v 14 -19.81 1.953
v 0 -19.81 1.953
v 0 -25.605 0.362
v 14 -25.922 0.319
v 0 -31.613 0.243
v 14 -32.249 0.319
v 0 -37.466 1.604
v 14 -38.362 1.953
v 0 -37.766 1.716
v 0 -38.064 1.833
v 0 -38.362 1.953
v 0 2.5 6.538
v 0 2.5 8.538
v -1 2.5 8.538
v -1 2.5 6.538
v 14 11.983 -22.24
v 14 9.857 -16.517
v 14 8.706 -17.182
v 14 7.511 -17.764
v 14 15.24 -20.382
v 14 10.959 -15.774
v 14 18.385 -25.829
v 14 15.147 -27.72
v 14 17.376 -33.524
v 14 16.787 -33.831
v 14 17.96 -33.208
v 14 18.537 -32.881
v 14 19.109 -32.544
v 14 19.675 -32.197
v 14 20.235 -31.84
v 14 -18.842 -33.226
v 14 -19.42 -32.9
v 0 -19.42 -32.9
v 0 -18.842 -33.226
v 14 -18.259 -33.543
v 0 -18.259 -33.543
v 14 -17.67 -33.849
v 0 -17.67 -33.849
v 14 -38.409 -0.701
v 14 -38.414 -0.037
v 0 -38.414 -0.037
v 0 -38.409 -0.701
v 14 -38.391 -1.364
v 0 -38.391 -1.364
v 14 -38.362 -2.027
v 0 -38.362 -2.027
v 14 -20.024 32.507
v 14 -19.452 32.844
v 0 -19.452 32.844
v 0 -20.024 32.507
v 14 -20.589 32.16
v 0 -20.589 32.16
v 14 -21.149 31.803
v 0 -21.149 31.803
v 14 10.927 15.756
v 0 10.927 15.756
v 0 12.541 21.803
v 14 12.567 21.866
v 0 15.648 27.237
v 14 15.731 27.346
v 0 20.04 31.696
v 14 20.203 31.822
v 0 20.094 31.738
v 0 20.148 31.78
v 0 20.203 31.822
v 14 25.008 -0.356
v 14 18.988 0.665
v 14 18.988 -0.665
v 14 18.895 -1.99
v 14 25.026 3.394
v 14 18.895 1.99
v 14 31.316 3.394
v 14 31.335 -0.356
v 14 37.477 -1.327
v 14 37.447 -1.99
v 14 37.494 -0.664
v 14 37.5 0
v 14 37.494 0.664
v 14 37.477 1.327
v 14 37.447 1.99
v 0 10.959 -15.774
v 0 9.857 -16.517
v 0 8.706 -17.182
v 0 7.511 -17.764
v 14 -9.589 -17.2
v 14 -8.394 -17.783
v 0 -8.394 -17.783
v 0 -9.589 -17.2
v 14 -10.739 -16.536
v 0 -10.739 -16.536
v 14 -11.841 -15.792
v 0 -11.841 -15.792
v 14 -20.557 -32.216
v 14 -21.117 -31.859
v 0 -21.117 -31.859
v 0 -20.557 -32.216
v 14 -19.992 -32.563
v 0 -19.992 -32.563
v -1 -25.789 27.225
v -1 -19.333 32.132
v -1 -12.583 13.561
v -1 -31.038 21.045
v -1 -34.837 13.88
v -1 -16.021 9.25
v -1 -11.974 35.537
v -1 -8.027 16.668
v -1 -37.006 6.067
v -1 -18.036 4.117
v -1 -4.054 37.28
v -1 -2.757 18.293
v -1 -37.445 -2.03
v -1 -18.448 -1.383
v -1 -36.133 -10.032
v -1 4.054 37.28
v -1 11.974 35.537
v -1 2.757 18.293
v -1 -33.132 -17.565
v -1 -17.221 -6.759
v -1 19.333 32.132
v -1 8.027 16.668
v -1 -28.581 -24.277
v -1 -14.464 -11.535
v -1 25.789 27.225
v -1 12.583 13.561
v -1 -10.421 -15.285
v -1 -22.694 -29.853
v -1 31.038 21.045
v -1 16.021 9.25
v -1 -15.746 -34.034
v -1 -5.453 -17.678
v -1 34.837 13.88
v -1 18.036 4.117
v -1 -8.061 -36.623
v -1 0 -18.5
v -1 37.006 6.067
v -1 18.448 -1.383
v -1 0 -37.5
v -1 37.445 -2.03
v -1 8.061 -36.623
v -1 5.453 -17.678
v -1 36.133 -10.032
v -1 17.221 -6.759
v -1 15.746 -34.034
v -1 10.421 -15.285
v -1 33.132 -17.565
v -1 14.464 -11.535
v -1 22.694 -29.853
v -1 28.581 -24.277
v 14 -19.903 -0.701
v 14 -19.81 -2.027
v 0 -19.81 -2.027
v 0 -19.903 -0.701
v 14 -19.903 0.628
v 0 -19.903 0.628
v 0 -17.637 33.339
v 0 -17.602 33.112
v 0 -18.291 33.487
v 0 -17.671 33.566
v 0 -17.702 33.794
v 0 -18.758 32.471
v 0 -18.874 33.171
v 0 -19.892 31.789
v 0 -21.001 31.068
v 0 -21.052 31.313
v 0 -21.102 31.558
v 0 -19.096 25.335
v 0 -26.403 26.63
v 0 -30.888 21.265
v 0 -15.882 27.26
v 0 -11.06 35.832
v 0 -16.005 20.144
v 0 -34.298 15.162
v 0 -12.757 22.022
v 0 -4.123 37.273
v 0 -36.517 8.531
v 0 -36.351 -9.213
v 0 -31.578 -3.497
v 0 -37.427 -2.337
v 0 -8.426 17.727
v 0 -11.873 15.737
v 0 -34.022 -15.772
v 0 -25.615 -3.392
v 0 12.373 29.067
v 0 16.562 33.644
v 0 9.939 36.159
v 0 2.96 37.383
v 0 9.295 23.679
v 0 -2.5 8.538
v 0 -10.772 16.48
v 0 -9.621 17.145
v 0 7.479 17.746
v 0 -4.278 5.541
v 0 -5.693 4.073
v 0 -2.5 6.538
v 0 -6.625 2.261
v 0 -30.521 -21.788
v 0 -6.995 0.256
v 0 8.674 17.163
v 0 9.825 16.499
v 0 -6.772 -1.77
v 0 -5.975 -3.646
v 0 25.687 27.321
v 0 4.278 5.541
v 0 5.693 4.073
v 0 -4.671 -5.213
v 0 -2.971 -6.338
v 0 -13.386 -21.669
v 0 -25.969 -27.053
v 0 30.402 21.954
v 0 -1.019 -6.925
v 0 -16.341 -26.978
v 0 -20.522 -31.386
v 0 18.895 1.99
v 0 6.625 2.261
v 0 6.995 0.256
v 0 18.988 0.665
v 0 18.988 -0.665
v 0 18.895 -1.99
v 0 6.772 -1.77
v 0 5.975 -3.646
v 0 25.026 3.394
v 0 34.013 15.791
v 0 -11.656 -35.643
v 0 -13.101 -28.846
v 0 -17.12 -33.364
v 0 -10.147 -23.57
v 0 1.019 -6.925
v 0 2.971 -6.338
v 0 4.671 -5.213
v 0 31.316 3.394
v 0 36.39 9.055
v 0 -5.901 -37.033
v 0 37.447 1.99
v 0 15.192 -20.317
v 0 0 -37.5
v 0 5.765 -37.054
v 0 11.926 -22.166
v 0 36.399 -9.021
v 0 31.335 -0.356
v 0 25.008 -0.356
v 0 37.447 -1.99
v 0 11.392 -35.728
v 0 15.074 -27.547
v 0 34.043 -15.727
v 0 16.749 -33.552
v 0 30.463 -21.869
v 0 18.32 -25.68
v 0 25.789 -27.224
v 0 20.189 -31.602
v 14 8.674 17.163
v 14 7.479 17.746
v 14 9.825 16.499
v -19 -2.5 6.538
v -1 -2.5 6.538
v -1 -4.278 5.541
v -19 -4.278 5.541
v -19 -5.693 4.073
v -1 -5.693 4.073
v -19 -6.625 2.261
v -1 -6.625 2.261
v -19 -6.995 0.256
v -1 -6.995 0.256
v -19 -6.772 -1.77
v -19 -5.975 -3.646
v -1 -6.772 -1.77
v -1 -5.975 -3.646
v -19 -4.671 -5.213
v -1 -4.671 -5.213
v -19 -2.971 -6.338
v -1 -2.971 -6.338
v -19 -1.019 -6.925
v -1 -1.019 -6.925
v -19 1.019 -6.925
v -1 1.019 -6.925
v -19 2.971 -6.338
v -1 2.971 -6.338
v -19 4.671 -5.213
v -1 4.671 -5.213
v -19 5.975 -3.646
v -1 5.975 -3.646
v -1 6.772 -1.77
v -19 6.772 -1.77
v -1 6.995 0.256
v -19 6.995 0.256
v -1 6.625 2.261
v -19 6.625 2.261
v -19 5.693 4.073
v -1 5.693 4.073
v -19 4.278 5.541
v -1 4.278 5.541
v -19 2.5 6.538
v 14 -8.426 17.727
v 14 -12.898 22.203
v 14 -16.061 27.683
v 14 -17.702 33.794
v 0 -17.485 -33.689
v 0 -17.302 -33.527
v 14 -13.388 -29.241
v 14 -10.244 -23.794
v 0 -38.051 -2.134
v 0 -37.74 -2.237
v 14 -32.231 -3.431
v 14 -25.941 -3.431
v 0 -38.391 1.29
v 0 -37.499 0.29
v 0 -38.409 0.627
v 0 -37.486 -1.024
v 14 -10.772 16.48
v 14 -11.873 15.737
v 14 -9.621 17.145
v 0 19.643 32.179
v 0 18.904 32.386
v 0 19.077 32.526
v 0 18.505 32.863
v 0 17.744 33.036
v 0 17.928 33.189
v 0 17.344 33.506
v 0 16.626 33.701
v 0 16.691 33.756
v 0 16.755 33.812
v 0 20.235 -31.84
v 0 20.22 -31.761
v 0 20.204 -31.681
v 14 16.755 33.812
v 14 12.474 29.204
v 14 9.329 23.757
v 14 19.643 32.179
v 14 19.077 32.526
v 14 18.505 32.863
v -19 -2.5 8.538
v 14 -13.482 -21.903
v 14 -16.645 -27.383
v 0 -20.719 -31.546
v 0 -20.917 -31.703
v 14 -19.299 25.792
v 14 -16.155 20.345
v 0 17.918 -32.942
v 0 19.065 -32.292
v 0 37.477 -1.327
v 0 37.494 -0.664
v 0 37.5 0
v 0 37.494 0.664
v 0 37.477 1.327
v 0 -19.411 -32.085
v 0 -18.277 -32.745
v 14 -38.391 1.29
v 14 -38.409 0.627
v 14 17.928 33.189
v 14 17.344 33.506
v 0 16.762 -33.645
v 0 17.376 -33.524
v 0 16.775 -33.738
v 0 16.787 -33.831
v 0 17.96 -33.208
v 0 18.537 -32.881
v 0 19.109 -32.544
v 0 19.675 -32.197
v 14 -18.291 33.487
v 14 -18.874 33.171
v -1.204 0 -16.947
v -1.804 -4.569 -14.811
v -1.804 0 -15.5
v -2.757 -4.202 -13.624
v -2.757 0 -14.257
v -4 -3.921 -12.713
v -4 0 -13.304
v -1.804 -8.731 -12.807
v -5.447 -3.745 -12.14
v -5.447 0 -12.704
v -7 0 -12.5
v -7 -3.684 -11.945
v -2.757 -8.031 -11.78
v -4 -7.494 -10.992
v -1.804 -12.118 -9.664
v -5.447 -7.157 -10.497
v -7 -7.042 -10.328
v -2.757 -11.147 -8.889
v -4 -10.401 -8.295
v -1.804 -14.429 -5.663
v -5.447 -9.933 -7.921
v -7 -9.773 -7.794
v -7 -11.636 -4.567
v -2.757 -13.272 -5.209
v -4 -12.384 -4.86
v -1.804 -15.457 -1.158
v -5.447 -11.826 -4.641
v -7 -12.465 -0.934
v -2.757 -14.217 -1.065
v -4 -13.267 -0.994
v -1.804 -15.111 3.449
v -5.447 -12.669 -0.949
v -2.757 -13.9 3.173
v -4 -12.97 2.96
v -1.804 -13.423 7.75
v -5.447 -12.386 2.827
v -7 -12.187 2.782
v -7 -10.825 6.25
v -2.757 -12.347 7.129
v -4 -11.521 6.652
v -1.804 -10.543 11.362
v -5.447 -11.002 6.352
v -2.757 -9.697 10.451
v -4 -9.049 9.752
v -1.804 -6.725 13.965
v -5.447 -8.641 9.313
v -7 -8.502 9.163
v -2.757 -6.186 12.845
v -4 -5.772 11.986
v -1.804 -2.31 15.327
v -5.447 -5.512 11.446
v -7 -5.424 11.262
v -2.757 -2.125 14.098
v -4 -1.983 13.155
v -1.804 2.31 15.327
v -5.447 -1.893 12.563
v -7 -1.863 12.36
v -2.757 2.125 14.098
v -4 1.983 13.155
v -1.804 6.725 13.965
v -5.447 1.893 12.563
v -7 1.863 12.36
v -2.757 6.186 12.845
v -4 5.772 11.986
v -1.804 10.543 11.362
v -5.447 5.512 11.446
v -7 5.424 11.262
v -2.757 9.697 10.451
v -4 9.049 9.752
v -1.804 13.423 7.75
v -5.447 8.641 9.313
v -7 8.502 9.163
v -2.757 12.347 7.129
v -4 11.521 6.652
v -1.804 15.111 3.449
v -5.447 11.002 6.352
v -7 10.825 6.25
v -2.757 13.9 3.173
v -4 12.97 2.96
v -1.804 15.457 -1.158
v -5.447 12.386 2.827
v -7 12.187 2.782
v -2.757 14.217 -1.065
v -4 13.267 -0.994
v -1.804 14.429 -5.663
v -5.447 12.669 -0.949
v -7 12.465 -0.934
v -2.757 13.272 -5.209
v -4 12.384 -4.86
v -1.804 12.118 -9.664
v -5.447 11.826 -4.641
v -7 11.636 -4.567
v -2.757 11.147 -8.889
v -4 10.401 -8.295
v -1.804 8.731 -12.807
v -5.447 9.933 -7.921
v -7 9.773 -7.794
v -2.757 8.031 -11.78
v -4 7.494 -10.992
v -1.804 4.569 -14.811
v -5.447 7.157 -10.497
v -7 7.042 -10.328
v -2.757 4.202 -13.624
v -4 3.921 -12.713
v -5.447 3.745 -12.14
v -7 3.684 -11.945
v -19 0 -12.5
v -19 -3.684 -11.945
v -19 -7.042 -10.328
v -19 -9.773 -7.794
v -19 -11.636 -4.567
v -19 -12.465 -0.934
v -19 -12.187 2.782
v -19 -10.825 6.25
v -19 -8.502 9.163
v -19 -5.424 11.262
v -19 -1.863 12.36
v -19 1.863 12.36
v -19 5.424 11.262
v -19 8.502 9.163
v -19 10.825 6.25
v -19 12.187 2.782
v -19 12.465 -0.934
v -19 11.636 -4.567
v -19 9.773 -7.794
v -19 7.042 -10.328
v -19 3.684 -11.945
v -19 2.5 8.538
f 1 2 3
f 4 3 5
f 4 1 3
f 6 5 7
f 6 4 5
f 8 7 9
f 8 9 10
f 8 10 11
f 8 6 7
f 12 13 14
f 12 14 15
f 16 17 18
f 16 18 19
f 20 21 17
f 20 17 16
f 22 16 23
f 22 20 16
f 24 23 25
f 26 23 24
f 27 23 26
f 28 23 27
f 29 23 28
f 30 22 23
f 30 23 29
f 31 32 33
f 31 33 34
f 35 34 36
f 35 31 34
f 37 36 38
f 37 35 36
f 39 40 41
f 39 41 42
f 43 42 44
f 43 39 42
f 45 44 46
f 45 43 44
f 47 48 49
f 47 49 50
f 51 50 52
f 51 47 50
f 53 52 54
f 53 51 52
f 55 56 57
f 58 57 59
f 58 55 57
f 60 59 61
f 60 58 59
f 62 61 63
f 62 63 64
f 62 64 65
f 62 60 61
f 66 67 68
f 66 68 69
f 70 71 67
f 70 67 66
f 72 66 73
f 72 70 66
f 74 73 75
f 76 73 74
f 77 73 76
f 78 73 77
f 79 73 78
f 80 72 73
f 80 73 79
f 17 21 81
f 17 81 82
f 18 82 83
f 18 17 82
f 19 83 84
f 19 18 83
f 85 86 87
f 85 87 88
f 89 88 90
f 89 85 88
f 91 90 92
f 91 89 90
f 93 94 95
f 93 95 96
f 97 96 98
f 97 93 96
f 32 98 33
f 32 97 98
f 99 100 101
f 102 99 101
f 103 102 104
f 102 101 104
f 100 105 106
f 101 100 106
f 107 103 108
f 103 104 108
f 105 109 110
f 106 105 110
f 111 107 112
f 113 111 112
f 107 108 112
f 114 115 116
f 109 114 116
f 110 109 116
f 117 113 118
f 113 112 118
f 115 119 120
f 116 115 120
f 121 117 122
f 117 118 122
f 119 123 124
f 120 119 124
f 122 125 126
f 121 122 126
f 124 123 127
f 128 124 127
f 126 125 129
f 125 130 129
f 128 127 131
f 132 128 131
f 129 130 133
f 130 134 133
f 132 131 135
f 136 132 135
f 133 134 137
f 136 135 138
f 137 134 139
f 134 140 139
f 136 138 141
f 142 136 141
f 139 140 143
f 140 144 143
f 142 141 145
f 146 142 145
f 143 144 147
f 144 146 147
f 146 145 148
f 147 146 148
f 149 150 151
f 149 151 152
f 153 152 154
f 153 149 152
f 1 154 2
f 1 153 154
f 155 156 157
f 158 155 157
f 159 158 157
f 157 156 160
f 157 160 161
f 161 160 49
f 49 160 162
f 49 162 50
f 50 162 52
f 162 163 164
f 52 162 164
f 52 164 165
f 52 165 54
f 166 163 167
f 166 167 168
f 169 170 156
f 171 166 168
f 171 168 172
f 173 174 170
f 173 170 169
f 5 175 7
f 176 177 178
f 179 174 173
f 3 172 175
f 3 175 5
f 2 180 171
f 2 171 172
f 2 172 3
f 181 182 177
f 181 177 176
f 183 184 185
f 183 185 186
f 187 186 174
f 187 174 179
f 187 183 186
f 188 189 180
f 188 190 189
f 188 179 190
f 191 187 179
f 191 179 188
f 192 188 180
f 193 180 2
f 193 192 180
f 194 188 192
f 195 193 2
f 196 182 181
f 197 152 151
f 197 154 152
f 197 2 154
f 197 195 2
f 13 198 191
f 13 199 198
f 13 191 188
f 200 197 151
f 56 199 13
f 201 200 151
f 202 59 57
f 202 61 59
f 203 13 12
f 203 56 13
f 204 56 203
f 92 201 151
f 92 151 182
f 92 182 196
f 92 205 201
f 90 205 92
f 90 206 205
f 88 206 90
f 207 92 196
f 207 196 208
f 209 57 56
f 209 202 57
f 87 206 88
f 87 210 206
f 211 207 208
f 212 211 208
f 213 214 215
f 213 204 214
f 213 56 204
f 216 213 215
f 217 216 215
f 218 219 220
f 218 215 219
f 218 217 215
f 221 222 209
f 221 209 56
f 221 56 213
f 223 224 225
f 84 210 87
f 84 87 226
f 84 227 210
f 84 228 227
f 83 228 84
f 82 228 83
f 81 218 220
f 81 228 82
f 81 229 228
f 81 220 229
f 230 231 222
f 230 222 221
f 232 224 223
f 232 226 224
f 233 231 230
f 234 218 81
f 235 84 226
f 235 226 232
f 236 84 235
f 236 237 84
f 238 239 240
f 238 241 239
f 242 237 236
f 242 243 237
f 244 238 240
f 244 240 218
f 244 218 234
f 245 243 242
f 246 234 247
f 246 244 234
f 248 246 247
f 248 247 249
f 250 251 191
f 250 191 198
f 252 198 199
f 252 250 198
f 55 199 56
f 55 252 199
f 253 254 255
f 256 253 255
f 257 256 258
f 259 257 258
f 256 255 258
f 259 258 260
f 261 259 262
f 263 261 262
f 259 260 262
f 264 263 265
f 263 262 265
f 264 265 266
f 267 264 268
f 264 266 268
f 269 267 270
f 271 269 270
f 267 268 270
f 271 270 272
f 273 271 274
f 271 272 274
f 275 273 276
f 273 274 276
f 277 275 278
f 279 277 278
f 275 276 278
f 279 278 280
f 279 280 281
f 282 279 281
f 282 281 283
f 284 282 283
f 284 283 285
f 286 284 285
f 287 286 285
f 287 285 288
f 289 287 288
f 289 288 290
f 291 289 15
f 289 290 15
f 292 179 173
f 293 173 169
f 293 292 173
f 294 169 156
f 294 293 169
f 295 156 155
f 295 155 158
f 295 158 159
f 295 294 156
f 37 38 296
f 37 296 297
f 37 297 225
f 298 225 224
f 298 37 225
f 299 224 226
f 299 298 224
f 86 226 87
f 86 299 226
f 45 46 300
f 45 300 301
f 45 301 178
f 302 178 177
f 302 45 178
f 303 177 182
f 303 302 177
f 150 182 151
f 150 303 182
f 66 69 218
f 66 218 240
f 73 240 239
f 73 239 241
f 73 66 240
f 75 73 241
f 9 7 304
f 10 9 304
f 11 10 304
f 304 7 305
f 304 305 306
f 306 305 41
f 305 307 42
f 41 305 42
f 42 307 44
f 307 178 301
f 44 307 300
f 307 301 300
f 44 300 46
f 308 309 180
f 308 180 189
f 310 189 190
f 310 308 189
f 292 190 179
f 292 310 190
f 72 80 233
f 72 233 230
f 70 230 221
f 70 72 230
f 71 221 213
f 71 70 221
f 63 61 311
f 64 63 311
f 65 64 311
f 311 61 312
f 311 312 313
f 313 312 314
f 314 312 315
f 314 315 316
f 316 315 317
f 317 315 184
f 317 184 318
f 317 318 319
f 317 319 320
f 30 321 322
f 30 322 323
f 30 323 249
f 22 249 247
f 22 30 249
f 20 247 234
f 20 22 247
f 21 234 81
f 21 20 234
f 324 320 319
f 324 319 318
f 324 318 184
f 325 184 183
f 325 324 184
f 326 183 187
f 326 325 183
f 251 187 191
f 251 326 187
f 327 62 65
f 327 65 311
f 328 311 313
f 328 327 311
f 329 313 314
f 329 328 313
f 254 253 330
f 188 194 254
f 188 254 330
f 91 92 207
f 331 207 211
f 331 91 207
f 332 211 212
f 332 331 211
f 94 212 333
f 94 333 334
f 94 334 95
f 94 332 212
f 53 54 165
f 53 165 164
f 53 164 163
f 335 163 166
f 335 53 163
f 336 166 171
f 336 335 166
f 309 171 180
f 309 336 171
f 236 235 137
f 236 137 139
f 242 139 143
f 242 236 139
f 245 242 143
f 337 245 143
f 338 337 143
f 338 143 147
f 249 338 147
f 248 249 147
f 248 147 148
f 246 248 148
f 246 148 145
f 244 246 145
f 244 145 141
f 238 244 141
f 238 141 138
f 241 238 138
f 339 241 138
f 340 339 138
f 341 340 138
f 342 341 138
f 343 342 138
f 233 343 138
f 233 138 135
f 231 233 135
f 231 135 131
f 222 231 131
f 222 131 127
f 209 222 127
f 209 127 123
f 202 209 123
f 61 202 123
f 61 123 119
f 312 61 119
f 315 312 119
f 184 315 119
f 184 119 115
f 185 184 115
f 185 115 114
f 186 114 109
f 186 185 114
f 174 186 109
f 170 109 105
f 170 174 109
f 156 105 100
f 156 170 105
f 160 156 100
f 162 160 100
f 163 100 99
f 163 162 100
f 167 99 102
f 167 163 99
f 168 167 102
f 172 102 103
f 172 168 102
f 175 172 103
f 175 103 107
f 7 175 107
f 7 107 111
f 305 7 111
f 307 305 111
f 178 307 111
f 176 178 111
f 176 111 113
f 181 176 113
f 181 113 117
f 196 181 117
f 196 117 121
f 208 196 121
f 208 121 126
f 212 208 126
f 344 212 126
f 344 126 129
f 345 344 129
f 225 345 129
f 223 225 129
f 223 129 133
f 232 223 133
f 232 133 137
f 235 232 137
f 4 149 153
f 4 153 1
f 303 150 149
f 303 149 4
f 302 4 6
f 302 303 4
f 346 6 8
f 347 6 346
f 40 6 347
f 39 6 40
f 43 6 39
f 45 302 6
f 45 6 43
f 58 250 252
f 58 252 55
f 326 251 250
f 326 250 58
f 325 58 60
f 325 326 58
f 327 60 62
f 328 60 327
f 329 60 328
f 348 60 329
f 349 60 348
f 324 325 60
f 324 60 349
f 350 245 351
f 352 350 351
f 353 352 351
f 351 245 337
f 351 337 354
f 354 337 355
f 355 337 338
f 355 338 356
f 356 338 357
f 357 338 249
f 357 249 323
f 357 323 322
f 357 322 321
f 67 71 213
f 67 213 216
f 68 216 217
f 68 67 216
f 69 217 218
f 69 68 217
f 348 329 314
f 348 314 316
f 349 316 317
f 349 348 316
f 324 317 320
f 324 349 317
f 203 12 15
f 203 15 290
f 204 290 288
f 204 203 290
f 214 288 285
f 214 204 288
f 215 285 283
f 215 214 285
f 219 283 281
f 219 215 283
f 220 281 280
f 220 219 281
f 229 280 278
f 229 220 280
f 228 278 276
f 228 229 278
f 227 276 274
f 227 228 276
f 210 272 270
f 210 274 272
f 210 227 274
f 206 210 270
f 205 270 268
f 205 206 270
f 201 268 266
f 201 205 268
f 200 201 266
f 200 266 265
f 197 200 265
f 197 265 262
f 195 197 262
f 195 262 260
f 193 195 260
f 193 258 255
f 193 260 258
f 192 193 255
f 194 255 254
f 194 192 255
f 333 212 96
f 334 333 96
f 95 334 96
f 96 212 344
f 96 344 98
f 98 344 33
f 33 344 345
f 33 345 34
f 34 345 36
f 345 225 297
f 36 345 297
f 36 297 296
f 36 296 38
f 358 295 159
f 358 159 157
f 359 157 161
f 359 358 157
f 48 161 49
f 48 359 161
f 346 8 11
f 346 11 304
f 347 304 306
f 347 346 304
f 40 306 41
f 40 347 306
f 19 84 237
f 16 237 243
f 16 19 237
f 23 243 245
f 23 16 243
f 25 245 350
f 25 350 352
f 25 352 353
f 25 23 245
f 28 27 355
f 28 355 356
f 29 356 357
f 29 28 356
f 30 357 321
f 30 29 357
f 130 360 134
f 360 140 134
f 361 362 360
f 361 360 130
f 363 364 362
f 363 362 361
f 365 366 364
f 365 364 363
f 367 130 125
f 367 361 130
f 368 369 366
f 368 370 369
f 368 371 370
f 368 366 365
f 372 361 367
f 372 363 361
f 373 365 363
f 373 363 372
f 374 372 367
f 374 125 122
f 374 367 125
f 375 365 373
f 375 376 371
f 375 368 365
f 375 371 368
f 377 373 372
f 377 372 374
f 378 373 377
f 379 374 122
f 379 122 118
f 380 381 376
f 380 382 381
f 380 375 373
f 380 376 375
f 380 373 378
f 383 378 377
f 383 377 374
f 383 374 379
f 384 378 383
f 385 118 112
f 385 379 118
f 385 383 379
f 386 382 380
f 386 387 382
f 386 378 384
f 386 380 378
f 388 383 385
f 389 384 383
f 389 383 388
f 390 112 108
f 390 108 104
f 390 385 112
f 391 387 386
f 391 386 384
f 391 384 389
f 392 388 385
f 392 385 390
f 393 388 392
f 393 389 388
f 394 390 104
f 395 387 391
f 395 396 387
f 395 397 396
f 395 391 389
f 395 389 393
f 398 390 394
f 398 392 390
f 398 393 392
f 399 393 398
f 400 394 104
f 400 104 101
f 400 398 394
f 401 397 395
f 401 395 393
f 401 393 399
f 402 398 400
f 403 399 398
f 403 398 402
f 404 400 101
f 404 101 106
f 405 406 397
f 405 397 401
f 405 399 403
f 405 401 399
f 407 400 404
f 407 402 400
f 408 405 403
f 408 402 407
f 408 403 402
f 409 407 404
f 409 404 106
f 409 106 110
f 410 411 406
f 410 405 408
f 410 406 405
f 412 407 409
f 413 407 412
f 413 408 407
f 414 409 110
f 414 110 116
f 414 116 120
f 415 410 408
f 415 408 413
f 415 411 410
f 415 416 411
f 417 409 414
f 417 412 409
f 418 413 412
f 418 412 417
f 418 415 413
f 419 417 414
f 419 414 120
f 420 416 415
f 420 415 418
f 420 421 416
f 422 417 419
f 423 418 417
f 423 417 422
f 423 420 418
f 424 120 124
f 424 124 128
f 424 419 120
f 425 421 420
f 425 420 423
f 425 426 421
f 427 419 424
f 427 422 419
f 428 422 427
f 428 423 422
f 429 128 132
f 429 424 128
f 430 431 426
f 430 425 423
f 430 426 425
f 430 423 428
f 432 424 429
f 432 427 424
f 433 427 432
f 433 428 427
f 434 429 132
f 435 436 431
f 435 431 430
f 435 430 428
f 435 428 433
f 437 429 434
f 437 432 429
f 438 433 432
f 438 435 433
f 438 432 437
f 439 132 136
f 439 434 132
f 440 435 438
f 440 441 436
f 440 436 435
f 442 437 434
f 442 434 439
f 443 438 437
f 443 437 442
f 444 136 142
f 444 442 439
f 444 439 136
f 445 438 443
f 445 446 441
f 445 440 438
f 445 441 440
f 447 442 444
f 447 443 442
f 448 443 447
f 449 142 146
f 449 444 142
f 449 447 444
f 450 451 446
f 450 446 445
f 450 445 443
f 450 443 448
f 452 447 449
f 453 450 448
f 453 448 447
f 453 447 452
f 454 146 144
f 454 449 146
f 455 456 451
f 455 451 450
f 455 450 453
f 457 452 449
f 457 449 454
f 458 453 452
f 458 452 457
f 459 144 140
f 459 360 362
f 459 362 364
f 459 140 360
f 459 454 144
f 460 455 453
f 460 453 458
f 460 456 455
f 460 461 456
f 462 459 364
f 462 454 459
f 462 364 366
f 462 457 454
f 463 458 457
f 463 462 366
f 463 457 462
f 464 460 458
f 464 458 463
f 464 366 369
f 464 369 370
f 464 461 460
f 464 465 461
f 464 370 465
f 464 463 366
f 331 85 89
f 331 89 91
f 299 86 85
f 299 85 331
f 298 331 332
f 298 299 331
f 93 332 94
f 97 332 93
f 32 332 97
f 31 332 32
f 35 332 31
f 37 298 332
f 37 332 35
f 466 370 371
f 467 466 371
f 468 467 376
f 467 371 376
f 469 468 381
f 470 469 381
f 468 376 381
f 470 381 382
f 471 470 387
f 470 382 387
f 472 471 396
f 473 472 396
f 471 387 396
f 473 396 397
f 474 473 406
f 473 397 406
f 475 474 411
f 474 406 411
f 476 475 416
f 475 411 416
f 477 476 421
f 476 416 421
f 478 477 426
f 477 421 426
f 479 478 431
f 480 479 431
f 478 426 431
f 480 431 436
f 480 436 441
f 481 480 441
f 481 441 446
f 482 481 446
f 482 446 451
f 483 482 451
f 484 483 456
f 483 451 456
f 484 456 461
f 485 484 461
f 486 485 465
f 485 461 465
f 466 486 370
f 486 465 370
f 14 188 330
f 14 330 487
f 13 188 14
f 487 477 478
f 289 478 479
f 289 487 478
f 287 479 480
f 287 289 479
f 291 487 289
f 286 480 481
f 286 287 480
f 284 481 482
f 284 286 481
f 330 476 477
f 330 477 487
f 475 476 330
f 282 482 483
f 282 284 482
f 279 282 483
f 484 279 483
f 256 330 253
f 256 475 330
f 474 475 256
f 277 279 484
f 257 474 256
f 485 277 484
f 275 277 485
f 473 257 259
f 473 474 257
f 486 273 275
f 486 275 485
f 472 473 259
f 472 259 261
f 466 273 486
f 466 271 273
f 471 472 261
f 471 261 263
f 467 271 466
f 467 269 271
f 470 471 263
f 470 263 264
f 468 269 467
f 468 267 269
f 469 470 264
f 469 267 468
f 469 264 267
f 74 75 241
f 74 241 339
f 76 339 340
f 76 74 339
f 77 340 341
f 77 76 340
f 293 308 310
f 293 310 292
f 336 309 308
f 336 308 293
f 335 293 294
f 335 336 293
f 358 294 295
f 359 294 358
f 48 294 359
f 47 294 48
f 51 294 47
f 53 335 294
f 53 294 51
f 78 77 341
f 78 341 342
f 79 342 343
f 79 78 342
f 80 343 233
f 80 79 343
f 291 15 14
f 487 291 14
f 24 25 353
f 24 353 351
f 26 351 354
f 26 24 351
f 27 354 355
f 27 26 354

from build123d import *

# Parameters (mm, degrees)
SKETCH3_R           = 37.5
BOSS_EXTRUDE1_DEPTH = 1
SKETCH4_R           = 12.5
BOSS_EXTRUDE2_DEPTH = 18
FILLET1_R           = 6
BOSS_EXTRUDE4_START = 14
BOSS_EXTRUDE4_DEPTH = 14
CIRPATTERN1_COUNT   = 6
CUT_EXTRUDE1_START  = -14
CUT_EXTRUDE1_DEPTH  = 14


with BuildPart() as part:
    # Sketch3 → Boss-Extrude1 (new body)
    with BuildSketch(Plane.YZ):
        with Locations(Location((0, 0, 0), (0, 0, 270))):
            Circle(SKETCH3_R)
    extrude(amount=-BOSS_EXTRUDE1_DEPTH)

    # Sketch4 → Boss-Extrude2 (add)
    with BuildSketch(Plane(origin=(-1, 0, 0), x_dir=(0, -1, 0), z_dir=(-1, 0, 0))):
        with Locations(Location((0, 0, 0), (0, 0, 270))):
            Circle(SKETCH4_R)
        with BuildLine():
            Line((-2.5, 8.538348415), (2.5, 8.538348415))
            Line((2.5, 8.538348415), (2.5, 6.538348415))
            ThreePointArc((2.5, 6.538348415), (0, -7), (-2.5, 6.538348415))
            Line((-2.5, 6.538348415), (-2.5, 8.538348415))
        make_face(mode=Mode.SUBTRACT)
    extrude(amount=BOSS_EXTRUDE2_DEPTH)

    # Fillet1
    fillet1_edges = [part.edges().sort_by_distance(p)[0] for p in [
        (-1, 0, 12.5),
    ]]
    fillet(fillet1_edges, radius=FILLET1_R)

    # Sketch7 → Boss-Extrude4 (add)
    with BuildSketch(Plane.YZ.offset(BOSS_EXTRUDE4_START)):
        with BuildLine():
            ThreePointArc((37.447145172, -1.990306119), (37.486783964, -0.995503903), (37.5, 0))
            ThreePointArc((37.5, 0), (37.486783964, 0.995503903), (37.447145172, 1.990306119))
            ThreePointArc((37.447145172, 1.990306119), (28.171306197, 3.571396011), (18.895467222, 1.990306119))
            ThreePointArc((18.895467222, 1.990306119), (19, 0), (18.895467222, -1.990306119))
            ThreePointArc((18.895467222, -1.990306119), (28.171306197, -0.148603989), (37.447145172, -1.990306119))
        make_face()
    boss_extrude4 = extrude(amount=-BOSS_EXTRUDE4_DEPTH)

    # CirPattern1: Boss-Extrude4 ×6 about axis
    cirpattern1_axis = Axis((0, -0.457216439, -0.018479017), (1, 0, 0))
    for i in range(1, CIRPATTERN1_COUNT):
        add(boss_extrude4.rotate(cirpattern1_axis, i * 360 / CIRPATTERN1_COUNT))

    # Sketch4<2> → Cut-Extrude1 (cut)
    with BuildSketch(Plane(origin=(-1, 0, 0), x_dir=(0, -1, 0), z_dir=(-1, 0, 0)).offset(CUT_EXTRUDE1_START)):
        with BuildLine():
            Line((-2.5, 8.538348415), (-2.5, 6.538348415))
            ThreePointArc((-2.5, 6.538348415), (0, -7), (2.5, 6.538348415))
            Line((2.5, 6.538348415), (2.5, 8.538348415))
            Line((2.5, 8.538348415), (-2.5, 8.538348415))
        make_face()
    extrude(amount=CUT_EXTRUDE1_DEPTH, mode=Mode.SUBTRACT)


solid = part.part
